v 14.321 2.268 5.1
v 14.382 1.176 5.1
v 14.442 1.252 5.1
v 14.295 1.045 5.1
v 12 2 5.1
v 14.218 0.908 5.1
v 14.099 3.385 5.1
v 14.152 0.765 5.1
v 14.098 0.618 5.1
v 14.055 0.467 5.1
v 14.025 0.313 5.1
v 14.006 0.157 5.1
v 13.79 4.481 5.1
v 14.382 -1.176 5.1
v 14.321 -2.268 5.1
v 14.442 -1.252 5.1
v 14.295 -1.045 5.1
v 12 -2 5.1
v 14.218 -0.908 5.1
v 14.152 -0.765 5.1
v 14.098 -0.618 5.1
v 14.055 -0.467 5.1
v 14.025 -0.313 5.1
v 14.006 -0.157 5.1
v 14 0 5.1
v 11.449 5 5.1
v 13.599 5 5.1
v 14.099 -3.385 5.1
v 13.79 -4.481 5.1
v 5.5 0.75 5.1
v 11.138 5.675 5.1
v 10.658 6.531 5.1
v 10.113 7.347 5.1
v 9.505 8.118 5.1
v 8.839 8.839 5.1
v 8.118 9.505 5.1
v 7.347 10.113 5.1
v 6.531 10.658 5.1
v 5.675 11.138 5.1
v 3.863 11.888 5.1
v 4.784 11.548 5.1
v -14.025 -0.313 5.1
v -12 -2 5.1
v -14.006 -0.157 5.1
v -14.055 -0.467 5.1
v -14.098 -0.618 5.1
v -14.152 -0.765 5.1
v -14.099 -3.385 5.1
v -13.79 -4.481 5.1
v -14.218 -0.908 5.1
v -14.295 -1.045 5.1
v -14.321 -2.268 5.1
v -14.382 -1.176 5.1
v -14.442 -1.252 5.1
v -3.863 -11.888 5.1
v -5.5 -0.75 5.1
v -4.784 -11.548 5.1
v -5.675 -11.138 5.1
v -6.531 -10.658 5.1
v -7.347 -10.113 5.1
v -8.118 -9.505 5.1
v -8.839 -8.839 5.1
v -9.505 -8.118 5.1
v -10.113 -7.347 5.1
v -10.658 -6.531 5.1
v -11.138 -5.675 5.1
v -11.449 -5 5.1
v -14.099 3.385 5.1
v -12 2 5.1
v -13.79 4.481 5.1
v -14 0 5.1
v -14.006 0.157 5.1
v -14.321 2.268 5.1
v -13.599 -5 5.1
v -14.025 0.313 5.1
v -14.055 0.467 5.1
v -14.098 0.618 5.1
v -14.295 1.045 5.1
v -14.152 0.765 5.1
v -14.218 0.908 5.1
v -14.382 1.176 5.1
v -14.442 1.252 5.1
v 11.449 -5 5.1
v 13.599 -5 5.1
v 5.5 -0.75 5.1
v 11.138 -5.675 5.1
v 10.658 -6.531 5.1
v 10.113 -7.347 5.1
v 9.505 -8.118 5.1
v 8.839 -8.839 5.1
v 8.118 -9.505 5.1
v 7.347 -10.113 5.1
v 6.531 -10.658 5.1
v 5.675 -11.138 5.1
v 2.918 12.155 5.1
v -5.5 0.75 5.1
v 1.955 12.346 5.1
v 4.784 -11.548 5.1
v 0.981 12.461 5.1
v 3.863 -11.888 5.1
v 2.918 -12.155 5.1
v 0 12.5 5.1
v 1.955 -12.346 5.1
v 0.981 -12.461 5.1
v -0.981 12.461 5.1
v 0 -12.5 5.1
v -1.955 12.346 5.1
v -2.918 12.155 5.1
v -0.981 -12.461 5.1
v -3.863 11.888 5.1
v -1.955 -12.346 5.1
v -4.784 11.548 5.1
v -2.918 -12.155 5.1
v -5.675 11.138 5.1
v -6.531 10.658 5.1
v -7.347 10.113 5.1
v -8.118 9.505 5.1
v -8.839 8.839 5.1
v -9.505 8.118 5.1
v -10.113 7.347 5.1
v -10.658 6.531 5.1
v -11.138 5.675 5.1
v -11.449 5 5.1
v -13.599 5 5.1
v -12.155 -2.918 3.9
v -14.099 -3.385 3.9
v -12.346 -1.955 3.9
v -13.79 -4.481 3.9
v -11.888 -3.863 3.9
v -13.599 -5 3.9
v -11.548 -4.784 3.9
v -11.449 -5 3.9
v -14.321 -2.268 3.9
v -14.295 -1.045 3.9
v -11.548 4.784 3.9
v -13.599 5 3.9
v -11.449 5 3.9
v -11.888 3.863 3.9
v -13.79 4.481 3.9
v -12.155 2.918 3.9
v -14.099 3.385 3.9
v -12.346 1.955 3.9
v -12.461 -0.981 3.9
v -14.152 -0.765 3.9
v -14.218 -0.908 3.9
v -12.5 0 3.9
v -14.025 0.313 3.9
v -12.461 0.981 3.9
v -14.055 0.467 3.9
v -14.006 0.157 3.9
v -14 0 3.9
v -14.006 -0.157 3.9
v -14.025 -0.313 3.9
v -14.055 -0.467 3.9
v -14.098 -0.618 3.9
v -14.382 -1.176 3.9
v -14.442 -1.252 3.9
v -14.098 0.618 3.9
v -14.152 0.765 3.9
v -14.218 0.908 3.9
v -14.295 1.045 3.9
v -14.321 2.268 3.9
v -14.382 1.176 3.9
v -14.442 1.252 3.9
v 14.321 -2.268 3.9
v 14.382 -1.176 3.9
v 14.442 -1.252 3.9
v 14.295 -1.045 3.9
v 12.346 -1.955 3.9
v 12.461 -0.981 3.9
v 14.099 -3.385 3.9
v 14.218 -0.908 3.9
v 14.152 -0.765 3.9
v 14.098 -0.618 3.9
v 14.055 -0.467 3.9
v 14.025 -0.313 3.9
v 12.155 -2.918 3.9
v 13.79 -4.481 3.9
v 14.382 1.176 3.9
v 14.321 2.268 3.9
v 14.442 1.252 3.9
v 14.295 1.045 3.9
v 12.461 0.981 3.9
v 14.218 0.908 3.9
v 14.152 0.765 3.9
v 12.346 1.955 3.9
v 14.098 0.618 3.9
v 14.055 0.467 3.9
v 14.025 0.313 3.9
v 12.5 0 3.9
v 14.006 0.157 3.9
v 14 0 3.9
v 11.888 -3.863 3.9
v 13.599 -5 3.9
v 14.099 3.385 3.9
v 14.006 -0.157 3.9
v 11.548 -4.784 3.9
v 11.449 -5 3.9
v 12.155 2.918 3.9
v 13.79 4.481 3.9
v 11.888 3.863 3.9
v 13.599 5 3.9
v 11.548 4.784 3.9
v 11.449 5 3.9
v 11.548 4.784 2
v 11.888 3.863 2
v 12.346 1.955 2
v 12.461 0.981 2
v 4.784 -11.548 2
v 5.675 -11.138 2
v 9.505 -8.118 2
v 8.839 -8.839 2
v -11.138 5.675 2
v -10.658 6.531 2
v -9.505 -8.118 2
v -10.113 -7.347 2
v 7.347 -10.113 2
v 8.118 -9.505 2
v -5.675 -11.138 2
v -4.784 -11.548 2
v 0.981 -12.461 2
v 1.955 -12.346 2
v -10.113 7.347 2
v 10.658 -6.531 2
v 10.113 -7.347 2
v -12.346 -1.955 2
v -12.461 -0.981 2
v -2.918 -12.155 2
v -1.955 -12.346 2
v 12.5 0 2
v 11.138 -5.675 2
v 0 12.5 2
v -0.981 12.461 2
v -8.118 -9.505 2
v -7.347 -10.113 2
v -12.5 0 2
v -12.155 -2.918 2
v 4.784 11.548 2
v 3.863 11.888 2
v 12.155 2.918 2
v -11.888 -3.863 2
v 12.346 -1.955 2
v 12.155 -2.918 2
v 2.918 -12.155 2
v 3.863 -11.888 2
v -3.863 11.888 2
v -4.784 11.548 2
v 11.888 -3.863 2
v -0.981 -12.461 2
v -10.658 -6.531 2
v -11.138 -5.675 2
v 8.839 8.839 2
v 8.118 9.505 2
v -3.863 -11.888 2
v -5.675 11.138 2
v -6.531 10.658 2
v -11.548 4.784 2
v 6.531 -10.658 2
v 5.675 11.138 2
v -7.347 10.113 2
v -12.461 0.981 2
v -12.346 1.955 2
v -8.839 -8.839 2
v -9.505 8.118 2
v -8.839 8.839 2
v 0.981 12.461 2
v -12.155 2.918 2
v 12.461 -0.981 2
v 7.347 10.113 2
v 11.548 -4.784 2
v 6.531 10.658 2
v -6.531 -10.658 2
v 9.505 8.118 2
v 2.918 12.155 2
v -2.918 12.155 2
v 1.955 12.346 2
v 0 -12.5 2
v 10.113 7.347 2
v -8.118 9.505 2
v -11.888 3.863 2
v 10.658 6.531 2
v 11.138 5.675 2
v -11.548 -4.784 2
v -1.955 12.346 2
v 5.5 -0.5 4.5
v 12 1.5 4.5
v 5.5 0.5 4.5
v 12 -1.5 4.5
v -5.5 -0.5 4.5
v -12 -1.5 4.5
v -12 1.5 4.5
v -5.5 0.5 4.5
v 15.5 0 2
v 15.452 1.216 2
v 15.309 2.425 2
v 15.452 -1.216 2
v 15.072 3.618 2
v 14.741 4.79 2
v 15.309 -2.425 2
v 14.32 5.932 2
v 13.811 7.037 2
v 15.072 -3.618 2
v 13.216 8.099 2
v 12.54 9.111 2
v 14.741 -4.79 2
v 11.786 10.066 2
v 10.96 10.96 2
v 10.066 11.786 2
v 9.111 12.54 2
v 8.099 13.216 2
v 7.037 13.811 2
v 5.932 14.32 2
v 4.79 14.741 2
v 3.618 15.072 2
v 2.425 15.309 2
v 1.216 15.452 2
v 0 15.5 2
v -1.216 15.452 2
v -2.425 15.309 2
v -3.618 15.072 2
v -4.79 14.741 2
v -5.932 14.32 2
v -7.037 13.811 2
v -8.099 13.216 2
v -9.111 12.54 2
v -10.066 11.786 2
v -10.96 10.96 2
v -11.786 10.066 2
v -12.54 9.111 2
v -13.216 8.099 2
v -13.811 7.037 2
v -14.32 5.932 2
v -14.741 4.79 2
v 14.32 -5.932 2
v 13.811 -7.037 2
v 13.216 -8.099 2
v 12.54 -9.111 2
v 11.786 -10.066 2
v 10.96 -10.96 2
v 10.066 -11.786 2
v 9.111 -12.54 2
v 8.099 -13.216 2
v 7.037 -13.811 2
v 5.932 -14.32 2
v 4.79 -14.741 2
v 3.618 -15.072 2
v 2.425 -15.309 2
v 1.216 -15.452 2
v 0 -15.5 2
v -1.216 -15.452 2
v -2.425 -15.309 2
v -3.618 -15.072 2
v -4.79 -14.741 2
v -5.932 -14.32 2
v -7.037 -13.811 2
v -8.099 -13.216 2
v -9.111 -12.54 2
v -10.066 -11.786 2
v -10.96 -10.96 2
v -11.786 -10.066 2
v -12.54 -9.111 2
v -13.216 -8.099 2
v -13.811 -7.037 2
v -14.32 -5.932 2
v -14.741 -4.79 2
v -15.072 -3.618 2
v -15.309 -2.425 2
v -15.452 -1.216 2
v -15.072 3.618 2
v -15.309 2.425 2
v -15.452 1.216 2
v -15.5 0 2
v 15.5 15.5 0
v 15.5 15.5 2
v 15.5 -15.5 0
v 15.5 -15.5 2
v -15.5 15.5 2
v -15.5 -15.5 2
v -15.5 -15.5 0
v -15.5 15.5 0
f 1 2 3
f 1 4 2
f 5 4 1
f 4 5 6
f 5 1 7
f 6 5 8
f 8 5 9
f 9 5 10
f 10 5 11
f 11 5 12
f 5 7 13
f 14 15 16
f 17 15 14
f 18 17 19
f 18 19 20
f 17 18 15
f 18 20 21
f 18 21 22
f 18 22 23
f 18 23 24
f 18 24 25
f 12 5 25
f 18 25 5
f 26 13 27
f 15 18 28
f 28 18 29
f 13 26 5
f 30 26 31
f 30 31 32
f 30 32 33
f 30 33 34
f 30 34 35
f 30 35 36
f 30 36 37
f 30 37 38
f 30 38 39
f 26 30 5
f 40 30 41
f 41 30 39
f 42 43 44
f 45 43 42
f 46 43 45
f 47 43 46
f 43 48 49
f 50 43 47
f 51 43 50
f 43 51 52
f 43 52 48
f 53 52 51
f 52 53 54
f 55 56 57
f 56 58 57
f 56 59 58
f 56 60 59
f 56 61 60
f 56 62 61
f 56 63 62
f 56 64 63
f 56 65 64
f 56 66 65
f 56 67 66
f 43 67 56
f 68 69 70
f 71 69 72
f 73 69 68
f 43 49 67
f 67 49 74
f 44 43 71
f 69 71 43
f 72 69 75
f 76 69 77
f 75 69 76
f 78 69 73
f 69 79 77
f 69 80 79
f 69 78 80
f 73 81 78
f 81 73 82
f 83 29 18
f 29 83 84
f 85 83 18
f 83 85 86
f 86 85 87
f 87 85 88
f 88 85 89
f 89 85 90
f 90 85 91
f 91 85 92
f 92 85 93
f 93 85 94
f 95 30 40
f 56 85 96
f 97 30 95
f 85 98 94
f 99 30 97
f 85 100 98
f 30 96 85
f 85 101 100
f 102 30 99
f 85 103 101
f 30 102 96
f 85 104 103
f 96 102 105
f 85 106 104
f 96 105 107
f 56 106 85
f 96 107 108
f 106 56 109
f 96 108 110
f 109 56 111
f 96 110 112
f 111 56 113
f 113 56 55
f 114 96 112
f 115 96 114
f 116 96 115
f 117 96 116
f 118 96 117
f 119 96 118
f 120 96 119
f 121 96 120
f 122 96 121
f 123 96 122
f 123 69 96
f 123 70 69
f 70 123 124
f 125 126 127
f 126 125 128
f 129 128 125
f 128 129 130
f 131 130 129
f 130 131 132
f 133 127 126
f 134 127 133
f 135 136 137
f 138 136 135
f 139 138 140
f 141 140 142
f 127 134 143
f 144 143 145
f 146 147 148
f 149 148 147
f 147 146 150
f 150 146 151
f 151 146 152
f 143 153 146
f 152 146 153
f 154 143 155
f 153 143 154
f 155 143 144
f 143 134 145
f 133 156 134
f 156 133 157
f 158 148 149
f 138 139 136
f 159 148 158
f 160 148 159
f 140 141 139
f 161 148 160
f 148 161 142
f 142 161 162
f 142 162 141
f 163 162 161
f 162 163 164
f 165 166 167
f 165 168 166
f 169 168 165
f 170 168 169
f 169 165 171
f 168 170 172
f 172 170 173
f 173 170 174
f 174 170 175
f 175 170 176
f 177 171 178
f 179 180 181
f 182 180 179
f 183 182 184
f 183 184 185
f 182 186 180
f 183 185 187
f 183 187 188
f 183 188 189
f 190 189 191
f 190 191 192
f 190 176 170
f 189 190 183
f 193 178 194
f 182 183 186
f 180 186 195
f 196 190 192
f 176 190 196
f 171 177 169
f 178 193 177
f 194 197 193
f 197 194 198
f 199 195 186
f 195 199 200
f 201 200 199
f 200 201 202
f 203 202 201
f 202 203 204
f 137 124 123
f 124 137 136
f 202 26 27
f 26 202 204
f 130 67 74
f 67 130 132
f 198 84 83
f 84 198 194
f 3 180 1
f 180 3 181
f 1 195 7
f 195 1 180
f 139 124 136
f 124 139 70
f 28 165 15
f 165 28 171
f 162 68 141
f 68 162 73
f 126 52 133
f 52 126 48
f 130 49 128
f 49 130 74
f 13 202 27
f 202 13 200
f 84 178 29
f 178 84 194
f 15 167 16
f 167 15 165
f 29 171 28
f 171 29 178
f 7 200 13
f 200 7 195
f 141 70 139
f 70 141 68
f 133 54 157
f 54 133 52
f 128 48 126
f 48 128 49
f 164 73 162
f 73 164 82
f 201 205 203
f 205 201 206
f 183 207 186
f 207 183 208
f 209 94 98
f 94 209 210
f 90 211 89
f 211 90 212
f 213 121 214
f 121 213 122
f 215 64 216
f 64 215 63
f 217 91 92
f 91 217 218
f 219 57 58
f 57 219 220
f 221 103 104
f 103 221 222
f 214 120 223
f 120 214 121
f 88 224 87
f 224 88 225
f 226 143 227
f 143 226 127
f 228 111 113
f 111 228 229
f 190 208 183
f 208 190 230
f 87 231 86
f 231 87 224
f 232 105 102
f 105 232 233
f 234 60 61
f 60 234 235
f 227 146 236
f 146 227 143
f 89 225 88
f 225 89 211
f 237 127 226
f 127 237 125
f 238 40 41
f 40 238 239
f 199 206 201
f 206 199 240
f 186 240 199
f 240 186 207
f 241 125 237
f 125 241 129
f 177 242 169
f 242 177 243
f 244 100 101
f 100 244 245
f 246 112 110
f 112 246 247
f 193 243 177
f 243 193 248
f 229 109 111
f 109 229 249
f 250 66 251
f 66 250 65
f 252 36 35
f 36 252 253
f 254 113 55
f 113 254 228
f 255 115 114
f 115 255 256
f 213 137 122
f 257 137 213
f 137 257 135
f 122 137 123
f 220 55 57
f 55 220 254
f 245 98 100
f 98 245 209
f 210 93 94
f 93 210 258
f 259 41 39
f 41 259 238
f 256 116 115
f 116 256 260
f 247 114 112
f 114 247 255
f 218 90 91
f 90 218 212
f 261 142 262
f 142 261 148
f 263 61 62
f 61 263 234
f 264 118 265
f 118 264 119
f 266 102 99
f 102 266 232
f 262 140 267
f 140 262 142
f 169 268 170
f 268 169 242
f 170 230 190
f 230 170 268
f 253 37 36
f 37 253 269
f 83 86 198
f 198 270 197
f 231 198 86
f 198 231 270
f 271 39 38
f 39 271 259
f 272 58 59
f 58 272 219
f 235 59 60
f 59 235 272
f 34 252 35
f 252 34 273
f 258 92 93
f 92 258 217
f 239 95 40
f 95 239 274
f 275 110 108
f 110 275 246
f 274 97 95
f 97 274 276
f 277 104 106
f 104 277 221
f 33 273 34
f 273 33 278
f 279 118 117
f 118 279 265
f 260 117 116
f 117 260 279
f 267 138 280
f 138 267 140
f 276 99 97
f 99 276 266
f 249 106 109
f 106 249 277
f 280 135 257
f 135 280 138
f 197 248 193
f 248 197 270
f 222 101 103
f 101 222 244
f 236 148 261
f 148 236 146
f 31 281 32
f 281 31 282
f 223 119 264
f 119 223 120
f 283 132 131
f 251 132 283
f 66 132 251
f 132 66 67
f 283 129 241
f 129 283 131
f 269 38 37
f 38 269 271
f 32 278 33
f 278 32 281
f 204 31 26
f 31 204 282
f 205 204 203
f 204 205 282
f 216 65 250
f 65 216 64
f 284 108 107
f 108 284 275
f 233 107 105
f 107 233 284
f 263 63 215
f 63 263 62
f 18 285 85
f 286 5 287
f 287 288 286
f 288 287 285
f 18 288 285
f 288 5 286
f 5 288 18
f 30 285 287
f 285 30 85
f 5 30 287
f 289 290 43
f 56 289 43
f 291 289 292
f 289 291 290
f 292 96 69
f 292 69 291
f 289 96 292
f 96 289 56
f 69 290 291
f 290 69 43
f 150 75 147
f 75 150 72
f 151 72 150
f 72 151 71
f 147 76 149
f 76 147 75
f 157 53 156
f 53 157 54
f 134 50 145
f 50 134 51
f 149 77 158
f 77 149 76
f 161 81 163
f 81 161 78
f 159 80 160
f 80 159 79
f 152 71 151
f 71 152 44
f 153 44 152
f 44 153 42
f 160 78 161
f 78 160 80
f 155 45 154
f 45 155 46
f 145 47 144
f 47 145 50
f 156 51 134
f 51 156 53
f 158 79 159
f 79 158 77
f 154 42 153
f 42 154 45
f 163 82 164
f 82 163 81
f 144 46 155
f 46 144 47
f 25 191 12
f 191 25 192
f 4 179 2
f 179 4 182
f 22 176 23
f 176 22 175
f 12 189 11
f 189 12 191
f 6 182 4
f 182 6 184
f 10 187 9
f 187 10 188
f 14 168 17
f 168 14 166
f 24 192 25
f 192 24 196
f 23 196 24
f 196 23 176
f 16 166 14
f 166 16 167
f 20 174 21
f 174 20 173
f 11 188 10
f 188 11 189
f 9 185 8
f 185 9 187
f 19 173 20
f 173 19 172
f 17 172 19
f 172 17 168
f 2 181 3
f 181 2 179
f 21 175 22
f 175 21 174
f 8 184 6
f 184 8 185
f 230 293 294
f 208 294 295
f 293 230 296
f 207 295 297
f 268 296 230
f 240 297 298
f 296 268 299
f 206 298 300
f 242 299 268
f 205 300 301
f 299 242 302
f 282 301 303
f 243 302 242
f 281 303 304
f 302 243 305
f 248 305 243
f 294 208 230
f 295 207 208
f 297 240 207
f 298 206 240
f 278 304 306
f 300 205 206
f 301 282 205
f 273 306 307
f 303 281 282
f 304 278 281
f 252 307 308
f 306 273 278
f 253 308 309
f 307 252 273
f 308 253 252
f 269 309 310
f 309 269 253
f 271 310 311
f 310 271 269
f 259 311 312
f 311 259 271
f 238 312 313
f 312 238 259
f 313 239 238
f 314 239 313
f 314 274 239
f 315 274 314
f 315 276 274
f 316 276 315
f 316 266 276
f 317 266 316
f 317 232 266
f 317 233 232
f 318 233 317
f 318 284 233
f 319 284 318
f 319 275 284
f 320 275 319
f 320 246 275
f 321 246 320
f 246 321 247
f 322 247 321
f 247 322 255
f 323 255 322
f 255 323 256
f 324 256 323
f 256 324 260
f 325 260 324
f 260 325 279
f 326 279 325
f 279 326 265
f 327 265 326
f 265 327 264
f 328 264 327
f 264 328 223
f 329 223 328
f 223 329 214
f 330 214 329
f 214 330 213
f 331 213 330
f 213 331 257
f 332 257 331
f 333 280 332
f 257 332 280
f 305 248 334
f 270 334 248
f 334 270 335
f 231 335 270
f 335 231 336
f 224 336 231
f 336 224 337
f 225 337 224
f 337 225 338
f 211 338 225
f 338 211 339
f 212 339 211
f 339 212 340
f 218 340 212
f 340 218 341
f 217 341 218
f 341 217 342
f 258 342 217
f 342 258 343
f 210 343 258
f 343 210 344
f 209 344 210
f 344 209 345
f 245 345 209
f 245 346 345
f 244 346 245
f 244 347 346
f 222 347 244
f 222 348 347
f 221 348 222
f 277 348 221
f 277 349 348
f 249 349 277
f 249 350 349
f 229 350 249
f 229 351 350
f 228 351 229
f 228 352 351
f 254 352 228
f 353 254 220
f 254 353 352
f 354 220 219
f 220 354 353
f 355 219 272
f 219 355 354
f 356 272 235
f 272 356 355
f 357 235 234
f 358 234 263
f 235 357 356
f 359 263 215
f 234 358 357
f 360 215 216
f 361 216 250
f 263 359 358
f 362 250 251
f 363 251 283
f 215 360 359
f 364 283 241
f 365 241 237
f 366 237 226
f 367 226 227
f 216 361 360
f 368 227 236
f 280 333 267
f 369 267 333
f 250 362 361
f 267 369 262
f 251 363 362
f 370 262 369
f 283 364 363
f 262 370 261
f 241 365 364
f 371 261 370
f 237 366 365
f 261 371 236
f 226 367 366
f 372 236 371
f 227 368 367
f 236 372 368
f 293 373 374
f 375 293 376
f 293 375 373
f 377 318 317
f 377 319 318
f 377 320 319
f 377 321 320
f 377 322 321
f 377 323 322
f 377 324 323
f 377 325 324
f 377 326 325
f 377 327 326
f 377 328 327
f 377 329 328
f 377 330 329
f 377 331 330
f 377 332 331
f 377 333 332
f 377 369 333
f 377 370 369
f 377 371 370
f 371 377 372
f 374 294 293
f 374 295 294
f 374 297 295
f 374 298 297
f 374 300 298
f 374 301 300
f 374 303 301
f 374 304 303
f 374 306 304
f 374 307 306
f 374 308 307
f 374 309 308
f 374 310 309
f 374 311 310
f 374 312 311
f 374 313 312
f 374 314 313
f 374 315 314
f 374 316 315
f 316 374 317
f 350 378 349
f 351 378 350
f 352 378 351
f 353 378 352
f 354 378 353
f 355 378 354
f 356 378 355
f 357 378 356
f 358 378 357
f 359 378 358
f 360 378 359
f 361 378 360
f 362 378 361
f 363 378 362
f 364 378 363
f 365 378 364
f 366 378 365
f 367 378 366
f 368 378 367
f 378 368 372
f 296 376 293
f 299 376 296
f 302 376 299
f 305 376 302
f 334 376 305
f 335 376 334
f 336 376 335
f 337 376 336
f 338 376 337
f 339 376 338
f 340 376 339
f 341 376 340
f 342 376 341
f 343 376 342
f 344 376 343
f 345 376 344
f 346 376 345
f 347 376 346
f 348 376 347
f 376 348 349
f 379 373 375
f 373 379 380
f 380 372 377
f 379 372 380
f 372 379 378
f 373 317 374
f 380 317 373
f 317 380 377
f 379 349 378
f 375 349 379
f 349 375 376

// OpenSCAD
module rast(lr=1,c=0.2,h=0.8){
    //cutouts in top
    hull(){
        translate([0,0,1.5-h])linear_extrude(.05) polygon([[lr*(12),1.5],[lr*5.5,0.5],[lr*5.5,-0.5],[lr*(12),-1.5]]);
        translate([0,0,1.5])linear_extrude(.05) polygon([[lr*(12),1.5+c],[lr*5.5,0.5+c/2],[lr*5.5,-0.5-c/2],[lr*(12),-1.5-c]]);
    }
}

$fn=80;


module mount(){
  translate([0,0,3.6]){
    translate([0,0,-3.6])linear_extrude(2){circle(d=31,center=true);}
    difference()
      {
      union(){ // upper part with brakets
        translate([0,0,-3.5])linear_extrude(5)circle(d=25,center=true);
        intersection() {
          translate([0,0,0.9])cube([35,10,1.2],center=true);
          cylinder(h=30,d=29,center=true);
        }
      }
      rast(1,0.5,.6);
      rast(-1,0.5,.6);
      translate([-16,0,0])cylinder(d=4,h=20,center=true); // circular cutout on edge
      translate([16,0,0])cylinder(d=4,h=20,center=true); // other edge
    }
  }
}

mount();
translate([0,0,1])cube([31,31,2],center=true);
